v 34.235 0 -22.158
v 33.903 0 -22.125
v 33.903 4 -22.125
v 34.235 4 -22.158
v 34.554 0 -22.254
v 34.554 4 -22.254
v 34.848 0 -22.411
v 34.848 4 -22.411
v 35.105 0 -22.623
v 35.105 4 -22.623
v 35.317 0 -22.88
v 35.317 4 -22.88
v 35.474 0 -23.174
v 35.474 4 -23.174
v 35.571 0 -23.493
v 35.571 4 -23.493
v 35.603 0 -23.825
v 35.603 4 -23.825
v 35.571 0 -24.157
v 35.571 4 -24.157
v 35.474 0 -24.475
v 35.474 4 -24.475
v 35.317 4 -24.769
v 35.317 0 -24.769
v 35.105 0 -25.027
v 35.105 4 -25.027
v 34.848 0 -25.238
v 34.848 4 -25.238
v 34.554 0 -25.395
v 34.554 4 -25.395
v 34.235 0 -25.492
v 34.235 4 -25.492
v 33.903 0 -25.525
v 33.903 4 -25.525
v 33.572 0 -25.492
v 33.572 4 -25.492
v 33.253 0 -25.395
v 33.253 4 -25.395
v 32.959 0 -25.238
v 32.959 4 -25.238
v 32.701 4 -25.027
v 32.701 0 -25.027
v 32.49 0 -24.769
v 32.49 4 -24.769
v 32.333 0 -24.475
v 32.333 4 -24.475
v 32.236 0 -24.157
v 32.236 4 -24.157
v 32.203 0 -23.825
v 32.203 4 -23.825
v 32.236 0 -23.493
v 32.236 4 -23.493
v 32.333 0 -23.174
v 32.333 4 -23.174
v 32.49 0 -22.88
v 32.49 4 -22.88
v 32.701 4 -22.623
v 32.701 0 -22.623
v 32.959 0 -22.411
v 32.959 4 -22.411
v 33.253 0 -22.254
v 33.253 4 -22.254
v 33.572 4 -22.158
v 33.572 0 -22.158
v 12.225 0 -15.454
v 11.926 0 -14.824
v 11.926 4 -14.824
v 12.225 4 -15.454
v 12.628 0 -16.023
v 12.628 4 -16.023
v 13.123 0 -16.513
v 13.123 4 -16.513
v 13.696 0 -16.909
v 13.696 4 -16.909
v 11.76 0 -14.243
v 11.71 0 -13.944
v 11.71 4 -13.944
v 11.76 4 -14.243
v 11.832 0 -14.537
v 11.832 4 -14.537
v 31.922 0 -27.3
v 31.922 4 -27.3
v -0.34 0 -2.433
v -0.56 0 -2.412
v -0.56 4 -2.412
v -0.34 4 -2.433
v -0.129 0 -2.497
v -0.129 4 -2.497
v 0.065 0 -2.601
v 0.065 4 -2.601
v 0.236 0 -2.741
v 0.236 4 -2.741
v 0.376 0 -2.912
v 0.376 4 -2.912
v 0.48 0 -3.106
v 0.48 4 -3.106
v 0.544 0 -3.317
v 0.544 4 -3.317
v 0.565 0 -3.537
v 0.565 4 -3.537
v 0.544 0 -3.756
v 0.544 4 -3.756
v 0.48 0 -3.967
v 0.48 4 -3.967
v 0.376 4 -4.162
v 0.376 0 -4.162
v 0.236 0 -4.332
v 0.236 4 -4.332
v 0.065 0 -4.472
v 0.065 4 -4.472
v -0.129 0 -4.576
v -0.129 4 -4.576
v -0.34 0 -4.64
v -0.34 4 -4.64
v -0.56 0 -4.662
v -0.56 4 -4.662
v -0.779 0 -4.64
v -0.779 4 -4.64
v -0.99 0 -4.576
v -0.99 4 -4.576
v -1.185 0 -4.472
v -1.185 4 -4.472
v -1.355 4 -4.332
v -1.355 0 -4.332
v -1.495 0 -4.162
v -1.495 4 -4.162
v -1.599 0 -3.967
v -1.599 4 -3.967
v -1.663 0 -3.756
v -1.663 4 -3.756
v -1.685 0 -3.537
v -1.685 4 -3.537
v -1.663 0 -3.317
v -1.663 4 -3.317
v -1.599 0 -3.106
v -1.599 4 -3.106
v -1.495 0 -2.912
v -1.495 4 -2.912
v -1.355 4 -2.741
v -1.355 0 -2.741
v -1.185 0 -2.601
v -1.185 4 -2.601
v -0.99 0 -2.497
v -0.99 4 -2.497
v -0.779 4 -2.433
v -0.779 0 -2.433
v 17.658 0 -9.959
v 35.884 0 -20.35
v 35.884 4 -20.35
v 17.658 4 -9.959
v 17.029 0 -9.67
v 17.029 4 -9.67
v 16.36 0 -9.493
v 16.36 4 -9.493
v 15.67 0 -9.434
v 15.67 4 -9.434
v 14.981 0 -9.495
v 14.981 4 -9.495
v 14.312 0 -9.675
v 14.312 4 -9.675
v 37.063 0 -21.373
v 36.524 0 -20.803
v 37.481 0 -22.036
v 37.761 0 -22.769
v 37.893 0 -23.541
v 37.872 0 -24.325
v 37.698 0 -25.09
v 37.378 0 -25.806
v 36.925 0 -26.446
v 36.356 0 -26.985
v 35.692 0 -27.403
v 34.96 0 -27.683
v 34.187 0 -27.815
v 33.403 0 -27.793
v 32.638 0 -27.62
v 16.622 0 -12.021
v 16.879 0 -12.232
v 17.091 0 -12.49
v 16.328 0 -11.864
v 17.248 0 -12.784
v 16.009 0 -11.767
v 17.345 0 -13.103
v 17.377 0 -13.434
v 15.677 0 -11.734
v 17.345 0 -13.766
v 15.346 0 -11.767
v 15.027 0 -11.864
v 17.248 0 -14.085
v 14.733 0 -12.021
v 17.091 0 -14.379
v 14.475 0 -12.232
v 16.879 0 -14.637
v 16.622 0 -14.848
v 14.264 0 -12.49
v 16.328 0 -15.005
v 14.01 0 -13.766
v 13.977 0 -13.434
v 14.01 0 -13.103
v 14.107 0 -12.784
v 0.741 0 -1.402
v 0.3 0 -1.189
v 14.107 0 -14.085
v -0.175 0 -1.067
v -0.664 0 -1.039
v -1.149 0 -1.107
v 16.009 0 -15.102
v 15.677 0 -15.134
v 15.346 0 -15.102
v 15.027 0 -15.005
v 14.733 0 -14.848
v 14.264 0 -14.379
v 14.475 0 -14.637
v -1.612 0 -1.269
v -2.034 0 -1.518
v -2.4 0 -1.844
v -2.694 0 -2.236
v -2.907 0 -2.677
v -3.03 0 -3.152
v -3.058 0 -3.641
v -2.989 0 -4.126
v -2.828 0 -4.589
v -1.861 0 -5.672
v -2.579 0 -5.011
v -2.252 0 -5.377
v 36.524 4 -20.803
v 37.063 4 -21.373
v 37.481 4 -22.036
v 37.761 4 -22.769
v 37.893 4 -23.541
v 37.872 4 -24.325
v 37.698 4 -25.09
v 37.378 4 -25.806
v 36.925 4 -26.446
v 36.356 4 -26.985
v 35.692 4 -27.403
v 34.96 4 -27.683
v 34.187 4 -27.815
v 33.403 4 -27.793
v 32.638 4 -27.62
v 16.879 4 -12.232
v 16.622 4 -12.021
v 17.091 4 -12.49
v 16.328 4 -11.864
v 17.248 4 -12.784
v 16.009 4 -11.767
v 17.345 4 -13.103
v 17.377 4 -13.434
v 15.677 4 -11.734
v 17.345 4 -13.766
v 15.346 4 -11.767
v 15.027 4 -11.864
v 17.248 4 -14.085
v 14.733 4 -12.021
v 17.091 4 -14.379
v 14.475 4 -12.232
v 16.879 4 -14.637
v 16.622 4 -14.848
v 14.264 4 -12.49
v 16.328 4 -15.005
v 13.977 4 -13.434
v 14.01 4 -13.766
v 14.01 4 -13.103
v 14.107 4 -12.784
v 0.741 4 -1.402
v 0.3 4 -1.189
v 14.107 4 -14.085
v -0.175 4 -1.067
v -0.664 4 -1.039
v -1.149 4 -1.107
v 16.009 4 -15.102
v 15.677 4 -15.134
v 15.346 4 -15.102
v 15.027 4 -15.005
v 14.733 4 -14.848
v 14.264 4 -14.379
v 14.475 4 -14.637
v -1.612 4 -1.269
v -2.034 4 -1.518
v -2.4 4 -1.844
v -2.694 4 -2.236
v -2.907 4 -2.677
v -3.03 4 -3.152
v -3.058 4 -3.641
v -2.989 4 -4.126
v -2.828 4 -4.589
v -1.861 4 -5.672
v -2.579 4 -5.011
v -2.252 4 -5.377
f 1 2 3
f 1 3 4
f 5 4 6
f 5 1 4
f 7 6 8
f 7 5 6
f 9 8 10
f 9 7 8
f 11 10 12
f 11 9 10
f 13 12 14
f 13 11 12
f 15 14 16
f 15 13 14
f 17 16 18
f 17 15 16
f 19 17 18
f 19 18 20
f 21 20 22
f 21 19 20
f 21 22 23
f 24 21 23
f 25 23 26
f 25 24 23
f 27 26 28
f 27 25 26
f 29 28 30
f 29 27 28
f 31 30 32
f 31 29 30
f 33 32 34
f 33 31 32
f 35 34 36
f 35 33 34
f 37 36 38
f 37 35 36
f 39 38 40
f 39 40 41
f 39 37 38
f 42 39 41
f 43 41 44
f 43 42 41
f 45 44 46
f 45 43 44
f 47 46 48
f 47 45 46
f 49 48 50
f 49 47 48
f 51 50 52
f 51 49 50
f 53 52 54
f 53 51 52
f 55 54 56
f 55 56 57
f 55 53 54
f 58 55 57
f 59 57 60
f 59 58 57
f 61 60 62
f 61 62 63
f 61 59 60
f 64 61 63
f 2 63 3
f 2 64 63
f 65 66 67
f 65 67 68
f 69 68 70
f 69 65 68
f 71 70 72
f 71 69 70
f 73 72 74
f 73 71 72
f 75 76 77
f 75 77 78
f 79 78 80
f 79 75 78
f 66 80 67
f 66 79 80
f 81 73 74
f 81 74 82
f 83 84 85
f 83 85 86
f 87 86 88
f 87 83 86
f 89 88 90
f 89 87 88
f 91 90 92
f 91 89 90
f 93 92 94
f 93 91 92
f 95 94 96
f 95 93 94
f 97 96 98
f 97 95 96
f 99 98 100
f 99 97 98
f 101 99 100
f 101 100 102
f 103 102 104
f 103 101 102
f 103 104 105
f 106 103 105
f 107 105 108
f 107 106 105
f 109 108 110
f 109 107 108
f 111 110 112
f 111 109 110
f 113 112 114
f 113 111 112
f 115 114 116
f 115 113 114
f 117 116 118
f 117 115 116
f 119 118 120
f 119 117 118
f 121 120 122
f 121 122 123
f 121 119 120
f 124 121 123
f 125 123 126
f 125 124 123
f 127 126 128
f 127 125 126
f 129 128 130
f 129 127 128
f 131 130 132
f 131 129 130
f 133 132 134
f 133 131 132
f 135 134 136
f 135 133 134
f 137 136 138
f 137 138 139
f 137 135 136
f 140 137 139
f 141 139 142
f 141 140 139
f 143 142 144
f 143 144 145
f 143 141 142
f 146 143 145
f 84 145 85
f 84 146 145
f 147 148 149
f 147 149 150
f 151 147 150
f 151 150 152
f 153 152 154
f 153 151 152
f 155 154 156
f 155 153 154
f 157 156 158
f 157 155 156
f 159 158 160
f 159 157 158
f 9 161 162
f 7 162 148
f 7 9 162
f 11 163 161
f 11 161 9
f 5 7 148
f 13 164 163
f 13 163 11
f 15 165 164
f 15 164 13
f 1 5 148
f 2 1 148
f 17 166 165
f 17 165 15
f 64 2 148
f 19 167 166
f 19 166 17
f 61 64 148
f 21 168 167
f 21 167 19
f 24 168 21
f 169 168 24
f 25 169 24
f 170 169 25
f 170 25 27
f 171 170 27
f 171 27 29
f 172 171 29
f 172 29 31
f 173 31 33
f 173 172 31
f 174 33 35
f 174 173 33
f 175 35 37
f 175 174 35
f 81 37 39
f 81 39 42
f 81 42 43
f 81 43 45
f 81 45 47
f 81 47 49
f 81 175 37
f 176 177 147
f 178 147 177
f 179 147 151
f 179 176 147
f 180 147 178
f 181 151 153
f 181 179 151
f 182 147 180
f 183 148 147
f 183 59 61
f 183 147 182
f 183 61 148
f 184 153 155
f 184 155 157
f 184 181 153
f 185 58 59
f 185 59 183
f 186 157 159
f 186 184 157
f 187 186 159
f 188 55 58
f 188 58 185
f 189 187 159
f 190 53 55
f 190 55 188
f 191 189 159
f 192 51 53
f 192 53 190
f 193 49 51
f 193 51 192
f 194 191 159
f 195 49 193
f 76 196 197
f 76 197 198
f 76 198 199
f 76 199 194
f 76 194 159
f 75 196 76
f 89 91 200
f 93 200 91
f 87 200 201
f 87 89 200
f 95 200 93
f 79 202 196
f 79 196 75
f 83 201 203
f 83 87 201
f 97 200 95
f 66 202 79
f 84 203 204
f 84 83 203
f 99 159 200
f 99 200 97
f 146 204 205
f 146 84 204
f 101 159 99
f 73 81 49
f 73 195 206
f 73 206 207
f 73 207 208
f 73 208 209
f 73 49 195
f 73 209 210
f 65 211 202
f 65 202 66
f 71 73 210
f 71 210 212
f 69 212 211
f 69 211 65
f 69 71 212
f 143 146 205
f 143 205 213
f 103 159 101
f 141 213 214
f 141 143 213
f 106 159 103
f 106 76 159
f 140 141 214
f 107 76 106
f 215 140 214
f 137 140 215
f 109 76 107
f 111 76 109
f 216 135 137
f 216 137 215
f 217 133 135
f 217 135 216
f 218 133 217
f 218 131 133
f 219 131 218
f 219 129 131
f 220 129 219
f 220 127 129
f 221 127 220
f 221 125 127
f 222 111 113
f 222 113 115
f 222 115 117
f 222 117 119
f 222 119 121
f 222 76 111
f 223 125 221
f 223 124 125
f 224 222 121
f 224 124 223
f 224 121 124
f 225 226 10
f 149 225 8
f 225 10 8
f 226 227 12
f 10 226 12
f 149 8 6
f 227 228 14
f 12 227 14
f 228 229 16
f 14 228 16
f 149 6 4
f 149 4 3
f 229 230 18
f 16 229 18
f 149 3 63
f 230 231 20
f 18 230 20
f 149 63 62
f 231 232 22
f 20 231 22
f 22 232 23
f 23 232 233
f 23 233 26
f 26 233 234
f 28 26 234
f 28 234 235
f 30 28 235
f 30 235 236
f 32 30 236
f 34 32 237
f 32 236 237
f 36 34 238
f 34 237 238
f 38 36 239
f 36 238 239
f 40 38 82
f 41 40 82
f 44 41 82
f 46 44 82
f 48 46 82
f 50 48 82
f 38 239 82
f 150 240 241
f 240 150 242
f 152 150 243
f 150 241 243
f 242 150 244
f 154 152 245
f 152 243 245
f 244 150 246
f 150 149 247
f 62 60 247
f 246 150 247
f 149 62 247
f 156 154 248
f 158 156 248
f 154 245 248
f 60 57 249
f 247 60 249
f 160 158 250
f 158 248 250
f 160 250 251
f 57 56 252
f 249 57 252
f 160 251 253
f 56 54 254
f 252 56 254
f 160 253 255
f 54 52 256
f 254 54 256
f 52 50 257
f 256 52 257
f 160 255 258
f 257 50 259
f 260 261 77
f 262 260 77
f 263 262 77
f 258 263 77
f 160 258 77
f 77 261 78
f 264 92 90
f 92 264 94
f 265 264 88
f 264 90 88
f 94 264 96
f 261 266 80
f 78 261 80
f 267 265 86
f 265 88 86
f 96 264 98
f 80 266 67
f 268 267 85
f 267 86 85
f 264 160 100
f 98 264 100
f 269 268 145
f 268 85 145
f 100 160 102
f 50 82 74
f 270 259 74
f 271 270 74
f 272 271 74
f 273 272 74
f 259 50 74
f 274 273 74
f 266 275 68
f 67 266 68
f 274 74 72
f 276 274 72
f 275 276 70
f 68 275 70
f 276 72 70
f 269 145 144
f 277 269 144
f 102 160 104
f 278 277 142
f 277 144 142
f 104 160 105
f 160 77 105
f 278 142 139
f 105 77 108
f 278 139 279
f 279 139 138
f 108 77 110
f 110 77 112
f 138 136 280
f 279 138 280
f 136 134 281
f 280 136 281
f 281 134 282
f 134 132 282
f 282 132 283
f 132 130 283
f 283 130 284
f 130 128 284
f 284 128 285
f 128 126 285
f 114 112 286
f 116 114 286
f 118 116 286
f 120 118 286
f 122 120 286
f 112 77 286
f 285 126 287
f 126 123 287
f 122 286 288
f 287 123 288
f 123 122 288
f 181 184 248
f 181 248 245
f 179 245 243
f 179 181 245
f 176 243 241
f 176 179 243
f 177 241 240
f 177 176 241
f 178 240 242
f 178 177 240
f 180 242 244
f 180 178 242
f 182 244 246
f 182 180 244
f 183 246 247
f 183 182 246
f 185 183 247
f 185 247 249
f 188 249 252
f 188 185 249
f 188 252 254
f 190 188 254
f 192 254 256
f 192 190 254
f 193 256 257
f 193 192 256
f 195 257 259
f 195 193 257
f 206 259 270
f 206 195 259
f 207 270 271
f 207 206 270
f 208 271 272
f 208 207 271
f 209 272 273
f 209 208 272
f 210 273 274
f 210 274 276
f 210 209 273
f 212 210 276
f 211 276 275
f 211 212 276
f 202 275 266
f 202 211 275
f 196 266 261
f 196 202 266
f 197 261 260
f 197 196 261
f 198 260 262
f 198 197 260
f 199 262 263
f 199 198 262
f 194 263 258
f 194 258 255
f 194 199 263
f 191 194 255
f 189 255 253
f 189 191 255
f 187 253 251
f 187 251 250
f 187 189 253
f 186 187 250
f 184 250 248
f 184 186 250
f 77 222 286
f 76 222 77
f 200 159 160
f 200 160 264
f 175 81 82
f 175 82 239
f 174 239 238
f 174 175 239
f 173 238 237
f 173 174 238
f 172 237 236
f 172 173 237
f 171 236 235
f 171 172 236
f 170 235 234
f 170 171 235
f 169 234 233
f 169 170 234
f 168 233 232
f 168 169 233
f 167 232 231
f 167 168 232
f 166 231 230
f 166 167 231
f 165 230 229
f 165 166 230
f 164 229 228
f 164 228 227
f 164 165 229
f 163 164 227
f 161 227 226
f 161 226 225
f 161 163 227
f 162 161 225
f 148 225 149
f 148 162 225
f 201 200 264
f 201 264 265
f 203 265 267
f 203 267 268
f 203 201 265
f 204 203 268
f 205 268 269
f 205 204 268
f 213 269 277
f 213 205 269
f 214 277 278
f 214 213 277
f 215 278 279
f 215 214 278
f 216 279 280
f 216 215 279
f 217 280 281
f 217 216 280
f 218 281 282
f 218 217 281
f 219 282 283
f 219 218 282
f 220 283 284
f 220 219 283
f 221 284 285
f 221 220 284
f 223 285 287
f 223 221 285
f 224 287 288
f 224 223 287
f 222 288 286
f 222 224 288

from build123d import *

# Parameters (mm, degrees)
SKETCH1_R           = 1.7
SKETCH1_R_2         = 1.125
BOSS_EXTRUDE1_DEPTH = 4


with BuildPart() as part:
    # Sketch1 → Boss-Extrude1 (new body)
    with BuildSketch(Plane(origin=(0, 0, 0), x_dir=(1, 0, 0), z_dir=(0, 1, 0))):
        with BuildLine():
            Line((-1.861032186, 5.671500837), (11.70980962, 13.943858026))
            ThreePointArc((11.70980962, 13.943858026), (11.793110745, 14.390229161), (11.926465203, 14.824283138))
            ThreePointArc((11.926465203, 14.824283138), (12.627588108, 16.022788534), (13.696191423, 16.909397504))
            Line((13.696191423, 16.909397504), (31.922238344, 27.299860881))
            ThreePointArc((31.922238344, 27.299860881), (37.378259624, 25.805929226), (35.88432797, 20.349907946))
            Line((35.88432797, 20.349907946), (17.658281049, 9.95944457))
            ThreePointArc((17.658281049, 9.95944457), (16.016619967, 9.448844707), (14.312262761, 9.674521117))
            Line((14.312262761, 9.674521117), (0.741420954, 1.402163927))
            ThreePointArc((0.741420954, 1.402163927), (-2.694474071, 2.235605811), (-1.861032186, 5.671500837))
        make_face()
        with Locations(Location((15.677236236, 13.434421037, 0), (0, 0, 270))):
            Circle(SKETCH1_R, mode=Mode.SUBTRACT)
        with Locations(Location((33.903283157, 23.824884413, 0), (0, 0, 270))):
            Circle(SKETCH1_R, mode=Mode.SUBTRACT)
        with Locations(Location((-0.559805616, 3.536832382, 0), (0, 0, 270))):
            Circle(SKETCH1_R_2, mode=Mode.SUBTRACT)
    extrude(amount=BOSS_EXTRUDE1_DEPTH)


solid = part.part
